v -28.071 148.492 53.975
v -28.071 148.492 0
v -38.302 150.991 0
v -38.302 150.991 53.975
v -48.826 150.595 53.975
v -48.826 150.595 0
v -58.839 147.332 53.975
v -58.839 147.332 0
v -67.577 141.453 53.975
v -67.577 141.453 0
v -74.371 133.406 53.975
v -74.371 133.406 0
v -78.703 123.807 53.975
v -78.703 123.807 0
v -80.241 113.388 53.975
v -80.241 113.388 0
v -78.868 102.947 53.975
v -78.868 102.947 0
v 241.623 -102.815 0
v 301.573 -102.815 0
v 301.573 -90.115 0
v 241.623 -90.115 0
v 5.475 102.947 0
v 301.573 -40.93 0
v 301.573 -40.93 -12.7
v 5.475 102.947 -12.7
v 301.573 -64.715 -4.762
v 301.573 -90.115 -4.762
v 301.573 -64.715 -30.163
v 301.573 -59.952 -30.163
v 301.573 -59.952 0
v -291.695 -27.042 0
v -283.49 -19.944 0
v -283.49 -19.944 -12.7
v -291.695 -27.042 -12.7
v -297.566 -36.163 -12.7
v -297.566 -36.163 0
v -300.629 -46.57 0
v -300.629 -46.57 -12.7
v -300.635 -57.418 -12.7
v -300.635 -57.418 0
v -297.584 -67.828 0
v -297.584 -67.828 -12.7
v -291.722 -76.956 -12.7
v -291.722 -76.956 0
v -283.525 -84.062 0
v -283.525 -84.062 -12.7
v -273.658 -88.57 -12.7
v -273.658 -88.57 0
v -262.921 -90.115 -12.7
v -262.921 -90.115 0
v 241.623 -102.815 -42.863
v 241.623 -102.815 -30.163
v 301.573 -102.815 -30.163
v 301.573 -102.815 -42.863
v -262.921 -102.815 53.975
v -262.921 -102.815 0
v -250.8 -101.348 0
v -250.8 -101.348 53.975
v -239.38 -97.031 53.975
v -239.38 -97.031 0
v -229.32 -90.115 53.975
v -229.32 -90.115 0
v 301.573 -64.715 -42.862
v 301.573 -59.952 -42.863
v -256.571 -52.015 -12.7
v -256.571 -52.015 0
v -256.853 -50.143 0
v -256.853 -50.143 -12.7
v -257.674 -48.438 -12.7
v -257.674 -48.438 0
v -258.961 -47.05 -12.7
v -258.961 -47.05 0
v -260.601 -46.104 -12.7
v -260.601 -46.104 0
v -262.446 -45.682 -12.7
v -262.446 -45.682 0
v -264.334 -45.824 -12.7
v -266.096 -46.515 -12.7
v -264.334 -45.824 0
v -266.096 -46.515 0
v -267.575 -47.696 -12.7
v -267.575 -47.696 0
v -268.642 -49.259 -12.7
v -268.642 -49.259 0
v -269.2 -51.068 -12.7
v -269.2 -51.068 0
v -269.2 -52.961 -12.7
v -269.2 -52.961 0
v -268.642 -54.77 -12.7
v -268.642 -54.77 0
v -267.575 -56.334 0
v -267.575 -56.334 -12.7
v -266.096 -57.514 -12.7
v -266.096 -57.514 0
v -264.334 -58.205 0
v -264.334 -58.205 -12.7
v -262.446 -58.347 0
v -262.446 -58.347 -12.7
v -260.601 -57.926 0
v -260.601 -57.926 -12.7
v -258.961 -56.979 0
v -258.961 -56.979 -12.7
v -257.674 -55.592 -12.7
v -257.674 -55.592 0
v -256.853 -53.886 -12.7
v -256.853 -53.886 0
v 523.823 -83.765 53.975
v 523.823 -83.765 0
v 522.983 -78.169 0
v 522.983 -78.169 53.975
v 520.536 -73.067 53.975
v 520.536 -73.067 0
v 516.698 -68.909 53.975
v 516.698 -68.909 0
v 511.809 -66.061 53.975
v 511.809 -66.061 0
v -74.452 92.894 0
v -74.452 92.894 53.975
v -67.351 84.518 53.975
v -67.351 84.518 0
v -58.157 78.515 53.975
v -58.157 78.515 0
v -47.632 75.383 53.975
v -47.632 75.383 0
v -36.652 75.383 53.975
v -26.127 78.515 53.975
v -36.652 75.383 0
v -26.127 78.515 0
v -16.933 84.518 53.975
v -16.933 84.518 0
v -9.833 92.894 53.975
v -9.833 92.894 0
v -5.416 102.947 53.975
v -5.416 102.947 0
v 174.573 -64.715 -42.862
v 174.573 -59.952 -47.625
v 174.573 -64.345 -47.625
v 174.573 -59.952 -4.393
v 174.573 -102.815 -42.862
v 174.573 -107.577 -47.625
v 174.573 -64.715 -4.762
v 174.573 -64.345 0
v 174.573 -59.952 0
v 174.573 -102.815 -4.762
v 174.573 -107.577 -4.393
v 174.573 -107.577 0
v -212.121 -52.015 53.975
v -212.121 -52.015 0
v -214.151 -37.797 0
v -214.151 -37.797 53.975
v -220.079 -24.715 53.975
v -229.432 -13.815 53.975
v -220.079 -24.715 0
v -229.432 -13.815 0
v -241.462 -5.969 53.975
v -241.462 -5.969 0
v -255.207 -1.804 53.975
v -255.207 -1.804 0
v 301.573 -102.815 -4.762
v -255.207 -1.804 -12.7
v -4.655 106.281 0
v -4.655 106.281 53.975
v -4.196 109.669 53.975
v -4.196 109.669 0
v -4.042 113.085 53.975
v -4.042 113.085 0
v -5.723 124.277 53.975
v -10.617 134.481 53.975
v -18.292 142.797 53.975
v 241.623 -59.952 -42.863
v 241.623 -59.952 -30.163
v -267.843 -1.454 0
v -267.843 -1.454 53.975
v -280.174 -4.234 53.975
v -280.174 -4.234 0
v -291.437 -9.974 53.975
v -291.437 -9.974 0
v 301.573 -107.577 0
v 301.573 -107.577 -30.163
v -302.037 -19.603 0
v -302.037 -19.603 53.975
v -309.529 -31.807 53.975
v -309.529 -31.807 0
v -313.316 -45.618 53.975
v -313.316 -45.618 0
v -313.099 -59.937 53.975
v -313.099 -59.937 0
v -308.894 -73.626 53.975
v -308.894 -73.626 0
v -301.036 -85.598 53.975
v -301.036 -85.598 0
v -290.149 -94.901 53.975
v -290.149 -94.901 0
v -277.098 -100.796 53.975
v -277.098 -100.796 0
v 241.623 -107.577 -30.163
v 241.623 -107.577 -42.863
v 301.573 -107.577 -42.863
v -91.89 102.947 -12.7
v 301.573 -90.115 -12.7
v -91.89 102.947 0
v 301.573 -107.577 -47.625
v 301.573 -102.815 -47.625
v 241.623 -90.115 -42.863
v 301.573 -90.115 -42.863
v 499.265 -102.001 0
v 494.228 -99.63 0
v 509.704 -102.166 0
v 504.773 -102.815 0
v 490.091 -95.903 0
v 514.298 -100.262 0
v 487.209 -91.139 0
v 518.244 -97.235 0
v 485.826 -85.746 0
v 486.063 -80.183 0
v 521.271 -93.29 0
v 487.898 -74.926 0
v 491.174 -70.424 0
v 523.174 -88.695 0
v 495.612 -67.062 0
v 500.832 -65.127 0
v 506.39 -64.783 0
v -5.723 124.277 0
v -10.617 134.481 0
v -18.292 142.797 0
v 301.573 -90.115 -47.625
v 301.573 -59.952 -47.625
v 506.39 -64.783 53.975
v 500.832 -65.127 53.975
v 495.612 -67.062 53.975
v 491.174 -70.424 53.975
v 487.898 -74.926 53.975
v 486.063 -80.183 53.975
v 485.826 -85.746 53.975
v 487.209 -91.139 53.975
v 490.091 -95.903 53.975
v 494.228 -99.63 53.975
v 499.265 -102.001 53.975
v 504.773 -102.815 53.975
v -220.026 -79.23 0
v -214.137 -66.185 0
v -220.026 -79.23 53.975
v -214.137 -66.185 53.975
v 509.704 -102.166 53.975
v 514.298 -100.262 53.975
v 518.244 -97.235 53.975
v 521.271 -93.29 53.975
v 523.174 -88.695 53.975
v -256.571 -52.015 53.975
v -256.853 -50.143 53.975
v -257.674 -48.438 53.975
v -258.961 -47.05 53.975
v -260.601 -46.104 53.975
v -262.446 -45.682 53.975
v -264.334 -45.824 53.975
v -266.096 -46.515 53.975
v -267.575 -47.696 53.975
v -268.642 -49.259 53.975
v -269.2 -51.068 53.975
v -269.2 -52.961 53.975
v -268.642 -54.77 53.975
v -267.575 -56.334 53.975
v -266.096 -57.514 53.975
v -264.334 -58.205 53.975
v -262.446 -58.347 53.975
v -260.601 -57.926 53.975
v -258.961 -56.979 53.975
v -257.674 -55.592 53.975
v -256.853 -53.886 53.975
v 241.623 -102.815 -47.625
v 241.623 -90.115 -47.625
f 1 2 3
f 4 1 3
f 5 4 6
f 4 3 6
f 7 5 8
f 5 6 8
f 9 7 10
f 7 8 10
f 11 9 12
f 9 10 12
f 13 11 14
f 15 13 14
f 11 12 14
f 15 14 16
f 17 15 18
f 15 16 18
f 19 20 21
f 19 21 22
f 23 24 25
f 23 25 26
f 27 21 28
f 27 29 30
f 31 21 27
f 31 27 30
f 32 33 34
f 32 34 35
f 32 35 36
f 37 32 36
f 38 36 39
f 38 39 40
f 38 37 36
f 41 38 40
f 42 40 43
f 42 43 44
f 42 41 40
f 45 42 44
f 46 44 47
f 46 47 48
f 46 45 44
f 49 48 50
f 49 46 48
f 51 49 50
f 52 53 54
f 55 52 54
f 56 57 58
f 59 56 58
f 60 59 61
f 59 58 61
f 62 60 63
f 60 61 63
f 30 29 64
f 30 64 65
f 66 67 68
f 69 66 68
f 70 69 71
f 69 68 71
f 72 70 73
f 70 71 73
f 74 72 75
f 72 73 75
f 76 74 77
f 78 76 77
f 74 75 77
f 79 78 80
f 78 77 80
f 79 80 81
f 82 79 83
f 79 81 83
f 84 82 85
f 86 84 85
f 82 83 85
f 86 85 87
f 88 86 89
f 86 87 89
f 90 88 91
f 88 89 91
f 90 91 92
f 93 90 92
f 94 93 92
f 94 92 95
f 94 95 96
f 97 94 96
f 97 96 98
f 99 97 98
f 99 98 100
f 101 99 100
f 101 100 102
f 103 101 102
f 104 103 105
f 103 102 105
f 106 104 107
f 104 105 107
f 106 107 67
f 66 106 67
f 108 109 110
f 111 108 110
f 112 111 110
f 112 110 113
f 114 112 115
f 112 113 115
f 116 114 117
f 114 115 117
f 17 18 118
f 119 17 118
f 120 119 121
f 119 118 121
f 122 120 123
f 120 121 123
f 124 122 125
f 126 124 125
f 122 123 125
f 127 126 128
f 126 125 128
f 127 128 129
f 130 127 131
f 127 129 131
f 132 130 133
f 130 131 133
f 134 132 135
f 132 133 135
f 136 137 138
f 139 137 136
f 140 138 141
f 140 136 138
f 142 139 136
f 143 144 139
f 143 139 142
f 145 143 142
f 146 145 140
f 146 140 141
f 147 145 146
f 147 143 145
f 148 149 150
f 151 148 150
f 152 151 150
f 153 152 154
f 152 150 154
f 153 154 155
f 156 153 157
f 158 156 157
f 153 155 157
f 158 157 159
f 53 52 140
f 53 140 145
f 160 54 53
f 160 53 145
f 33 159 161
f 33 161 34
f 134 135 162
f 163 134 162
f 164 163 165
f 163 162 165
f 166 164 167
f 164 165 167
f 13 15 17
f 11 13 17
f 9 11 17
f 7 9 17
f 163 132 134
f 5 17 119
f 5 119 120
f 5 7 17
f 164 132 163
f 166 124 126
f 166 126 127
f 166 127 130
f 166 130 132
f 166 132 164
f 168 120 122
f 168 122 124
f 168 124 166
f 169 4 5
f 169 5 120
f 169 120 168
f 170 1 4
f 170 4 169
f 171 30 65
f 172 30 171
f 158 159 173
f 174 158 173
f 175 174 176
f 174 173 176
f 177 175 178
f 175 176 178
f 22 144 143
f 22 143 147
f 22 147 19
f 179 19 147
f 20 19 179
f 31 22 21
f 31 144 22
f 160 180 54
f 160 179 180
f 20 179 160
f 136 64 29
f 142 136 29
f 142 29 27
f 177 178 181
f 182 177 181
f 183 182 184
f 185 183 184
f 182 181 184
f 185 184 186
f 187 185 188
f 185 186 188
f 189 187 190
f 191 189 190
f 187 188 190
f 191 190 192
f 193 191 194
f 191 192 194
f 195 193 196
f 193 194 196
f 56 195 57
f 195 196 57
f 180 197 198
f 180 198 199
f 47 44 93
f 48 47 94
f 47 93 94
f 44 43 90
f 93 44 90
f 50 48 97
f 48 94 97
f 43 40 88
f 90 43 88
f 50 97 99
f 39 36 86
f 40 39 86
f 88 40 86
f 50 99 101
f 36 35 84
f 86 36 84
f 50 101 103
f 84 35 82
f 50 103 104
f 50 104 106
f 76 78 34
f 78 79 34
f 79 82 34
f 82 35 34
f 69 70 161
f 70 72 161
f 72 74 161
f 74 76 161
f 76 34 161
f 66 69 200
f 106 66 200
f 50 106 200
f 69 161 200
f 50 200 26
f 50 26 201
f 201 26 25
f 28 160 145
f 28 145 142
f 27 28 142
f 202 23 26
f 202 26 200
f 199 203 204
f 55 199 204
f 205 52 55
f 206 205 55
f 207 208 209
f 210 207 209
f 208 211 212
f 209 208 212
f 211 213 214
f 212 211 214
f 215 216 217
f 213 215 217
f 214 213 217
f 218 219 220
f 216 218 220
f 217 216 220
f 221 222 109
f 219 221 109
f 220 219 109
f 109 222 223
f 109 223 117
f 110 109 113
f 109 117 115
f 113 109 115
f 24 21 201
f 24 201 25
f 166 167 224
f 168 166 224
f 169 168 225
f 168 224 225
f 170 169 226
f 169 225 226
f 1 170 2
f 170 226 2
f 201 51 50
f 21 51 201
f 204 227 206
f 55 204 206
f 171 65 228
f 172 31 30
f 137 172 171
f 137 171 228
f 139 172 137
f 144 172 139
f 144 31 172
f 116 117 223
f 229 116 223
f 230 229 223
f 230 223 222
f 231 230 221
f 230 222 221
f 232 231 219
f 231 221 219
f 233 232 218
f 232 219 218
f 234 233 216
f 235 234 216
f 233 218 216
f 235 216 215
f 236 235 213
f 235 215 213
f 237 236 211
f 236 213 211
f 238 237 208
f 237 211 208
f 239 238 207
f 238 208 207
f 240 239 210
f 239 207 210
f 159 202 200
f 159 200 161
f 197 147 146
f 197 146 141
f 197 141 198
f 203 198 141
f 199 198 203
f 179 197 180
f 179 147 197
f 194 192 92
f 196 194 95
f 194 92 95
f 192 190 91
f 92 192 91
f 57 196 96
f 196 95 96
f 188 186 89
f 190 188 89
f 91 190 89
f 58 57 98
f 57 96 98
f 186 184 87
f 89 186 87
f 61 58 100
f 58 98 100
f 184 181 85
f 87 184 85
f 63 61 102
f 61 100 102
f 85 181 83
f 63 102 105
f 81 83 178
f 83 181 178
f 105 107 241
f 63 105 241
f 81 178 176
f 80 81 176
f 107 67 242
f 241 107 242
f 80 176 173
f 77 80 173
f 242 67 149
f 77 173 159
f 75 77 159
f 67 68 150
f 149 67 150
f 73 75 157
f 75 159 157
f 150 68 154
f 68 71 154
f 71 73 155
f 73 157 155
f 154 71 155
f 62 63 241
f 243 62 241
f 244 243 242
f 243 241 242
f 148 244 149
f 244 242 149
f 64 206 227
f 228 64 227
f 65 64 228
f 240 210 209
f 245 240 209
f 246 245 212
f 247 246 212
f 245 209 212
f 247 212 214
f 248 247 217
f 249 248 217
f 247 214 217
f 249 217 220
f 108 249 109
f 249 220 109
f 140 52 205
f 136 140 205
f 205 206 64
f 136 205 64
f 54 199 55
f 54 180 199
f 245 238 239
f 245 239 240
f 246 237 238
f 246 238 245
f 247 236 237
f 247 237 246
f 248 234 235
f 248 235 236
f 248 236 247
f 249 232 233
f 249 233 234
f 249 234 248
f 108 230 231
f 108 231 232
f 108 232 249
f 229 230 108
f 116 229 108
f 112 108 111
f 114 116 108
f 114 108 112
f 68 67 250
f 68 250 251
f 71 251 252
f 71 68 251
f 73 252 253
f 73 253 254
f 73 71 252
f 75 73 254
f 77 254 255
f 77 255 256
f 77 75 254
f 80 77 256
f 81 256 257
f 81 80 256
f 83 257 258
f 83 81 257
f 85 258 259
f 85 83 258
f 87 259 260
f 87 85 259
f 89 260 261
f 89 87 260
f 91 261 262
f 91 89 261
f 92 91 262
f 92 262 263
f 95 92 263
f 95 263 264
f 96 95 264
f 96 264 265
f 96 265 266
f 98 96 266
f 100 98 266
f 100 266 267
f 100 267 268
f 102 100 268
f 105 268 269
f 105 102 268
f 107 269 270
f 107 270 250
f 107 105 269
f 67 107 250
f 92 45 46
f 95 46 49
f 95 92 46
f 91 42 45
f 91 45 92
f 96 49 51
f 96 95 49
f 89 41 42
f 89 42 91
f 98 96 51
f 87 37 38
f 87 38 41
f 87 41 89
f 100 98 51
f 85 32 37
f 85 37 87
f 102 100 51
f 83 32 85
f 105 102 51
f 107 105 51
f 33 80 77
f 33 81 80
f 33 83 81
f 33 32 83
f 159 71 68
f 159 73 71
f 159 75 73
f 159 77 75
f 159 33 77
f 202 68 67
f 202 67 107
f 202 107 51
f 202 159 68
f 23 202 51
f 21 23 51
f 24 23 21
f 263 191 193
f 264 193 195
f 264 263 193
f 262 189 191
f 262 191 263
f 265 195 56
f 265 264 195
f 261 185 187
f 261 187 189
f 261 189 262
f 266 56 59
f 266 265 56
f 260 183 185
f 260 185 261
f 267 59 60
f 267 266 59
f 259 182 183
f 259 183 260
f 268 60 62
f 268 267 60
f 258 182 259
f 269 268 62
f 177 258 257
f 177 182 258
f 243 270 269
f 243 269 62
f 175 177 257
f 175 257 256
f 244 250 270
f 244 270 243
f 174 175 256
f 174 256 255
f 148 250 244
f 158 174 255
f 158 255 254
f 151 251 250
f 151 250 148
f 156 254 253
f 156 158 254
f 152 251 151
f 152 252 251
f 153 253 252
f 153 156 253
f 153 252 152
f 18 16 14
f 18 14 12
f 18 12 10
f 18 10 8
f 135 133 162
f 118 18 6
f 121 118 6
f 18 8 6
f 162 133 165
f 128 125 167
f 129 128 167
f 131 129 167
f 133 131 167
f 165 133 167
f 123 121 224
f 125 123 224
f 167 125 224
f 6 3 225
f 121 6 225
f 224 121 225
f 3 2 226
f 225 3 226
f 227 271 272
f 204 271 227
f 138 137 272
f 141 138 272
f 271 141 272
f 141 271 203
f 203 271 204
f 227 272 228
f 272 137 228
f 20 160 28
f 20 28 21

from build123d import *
from build123d import SkipClean  # not in build123d's __all__

# Parameters (mm, degrees)
F0_W            = 67.0499014769
F0_H            = 12.7
F0_H_2          = 4.7625
F0_W_2          = 59.9500985231
F0_H_3          = 25.7697334349
F1_DEPTH        = 47.625
F1_COPIES_COUNT = 2
F1_COPIES_ANGLE = 90
F2_W            = 38.1
F2_H            = 38.1
F3_DEPTH        = 127
F0_R            = 6.35
F0_W_3          = 339.3500985231
F4_DEPTH        = 12.7
F5_DEPTH        = 53.975


# Not quite as in the source:
# - a pattern or mirror of a feature is missing from the dataset's text; its kind, count and spacing are read off the source's solid
# - a feature names something its author has since deleted; it is built from what else it names


with BuildPart() as f1:
    # F0 (on Top) → F1 (new body)
    with BuildSketch(Plane.XY):
        with Locations((208.0981279893, -96.4646462023)):
            Rectangle(F0_W, F0_H)
        with Locations((208.0981279893, -105.1958962023)):
            Rectangle(F0_W, F0_H_2)
        with Locations((271.5981279893, -105.1958962023)):
            Rectangle(F0_W_2, F0_H_2)
        with Locations((208.0981279893, -77.2297794849)):
            Rectangle(F0_W, F0_H_3)
        Polygon((241.6230787277, -64.3449127674), (241.6230787277, -90.1146462023), (301.5731772508, -90.1146462023), (301.5731772508, -59.9521462023), (174.5731772508, -59.9521462023), (174.5731772508, -64.3449127674), align=None)
    extrude(amount=-F1_DEPTH)

    # F1_copies: F1 ×2 about axis
    f1_copies_axis = Axis((0, -83.764646, -23.8125), (1, 0, 0))


with BuildPart() as f1_1:
    add(f1.part, clean=False)
    with SkipClean():  # cleaning this boolean's faces spoils the solid; the shape is the same uncleaned
        for i in range(1, F1_COPIES_COUNT):
            add(f1.part.rotate(f1_copies_axis, i * F1_COPIES_ANGLE / (F1_COPIES_COUNT - 1)), clean=False)

    # F2 (on face) → F3 (cut, through all)
    with BuildSketch(Plane.YZ.offset(301.5731772508)):
        with Locations((-83.7646462023, -23.8125)):
            Rectangle(F2_W, F2_H)
    with SkipClean():  # cleaning this boolean's faces spoils the solid; the shape is the same uncleaned
        extrude(amount=-F3_DEPTH, mode=Mode.SUBTRACT)


with BuildPart() as f4:
    # F0 (on Top) → F4 (new body)
    with BuildSketch(Plane.XY):
        with BuildLine():
            Line((-91.8902158737, 102.9467433691), (-255.2069353227, -1.8036898565))
            ThreePointArc((-255.2069353227, -1.8036898565), (-224.3686917514, -18.9330173376), (-212.1205507423, -52.0146462023))
            ThreePointArc((-212.1205507423, -52.0146462023), (-216.6195090918, -72.9156878528), (-229.3195090918, -90.1146462023))
            Line((-229.3195090918, -90.1146462023), (-164.7769212723, -90.1146462023))
            Line((-164.7769212723, -90.1146462023), (-164.7769212723, -64.3449127674))
            Line((-164.7769212723, -64.3449127674), (174.5731772508, -64.3449127674))
            Line((174.5731772508, -64.3449127674), (174.5731772508, -59.9521462023))
            Line((174.5731772508, -59.9521462023), (301.5731772508, -59.9521462023))
            Line((301.5731772508, -59.9521462023), (301.5731772508, -40.9296154976))
            Line((301.5731772508, -40.9296154976), (5.4748591793, 102.9467433691))
            Line((5.4748591793, 102.9467433691), (-5.4159459459, 102.9467433691))
            ThreePointArc((-5.4159459459, 102.9467433691), (-42.1422114596, 74.9853537977), (-78.8684769732, 102.9467433691))
            Line((-78.8684769732, 102.9467433691), (-91.8902158737, 102.9467433691))
        make_face()
        with BuildLine():
            ThreePointArc((-212.1205507423, -52.0146462023), (-224.3686917514, -18.9330173376), (-255.2069353227, -1.8036898565))
            Line((-255.2069353227, -1.8036898565), (-283.4902114903, -19.9444254873))
            ThreePointArc((-283.4902114903, -19.9444254873), (-244.646170787, -18.5832681684), (-224.8205507423, -52.0146462023))
            ThreePointArc((-224.8205507423, -52.0146462023), (-235.9797823791, -78.9554145655), (-262.9205507423, -90.1146462023))
            Line((-262.9205507423, -90.1146462023), (-229.3195090918, -90.1146462023))
            ThreePointArc((-229.3195090918, -90.1146462023), (-216.6195090918, -72.9156878528), (-212.1205507423, -52.0146462023))
        make_face()
        with BuildLine():
            ThreePointArc((-224.8205507423, -52.0146462023), (-244.646170787, -18.5832681684), (-283.4902114903, -19.9444254873))
            ThreePointArc((-283.4902114903, -19.9444254873), (-299.4820428429, -62.7322623262), (-262.9205507423, -90.1146462023))
            ThreePointArc((-262.9205507423, -90.1146462023), (-235.9797823791, -78.9554145655), (-224.8205507423, -52.0146462023))
        make_face()
        with Locations((-262.9205507423, -52.0146462023)):
            Circle(F0_R, mode=Mode.SUBTRACT)
        with Locations((4.8981279893, -77.2297794849)):
            Rectangle(F0_W_3, F0_H_3)
        with BuildLine():
            Line((-5.4159459459, 102.9467433691), (-78.8684769732, 102.9467433691))
            ThreePointArc((-78.8684769732, 102.9467433691), (-42.1422114596, 74.9853537977), (-5.4159459459, 102.9467433691))
        make_face()
        with Locations((208.0981279893, -77.2297794849)):
            Rectangle(F0_W, F0_H_3)
        Polygon((241.6230787277, -64.3449127674), (241.6230787277, -90.1146462023), (301.5731772508, -90.1146462023), (301.5731772508, -59.9521462023), (174.5731772508, -59.9521462023), (174.5731772508, -64.3449127674), align=None)
    extrude(amount=-F4_DEPTH)


with BuildPart() as f5:
    # F0 (on Top) → F5 (new body)
    with BuildSketch(Plane.XY):
        with BuildLine():
            ThreePointArc((-28.0713410878, 148.4918589483), (-46.2820197032, 150.9597777234), (-63.5295651655, 144.616149878))
            ThreePointArc((-63.5295651655, 144.616149878), (-77.896694317, 126.2469249653), (-78.8684769732, 102.9467433691))
            Line((-78.8684769732, 102.9467433691), (-5.4159459459, 102.9467433691))
            ThreePointArc((-5.4159459459, 102.9467433691), (-4.3872070491, 107.9697265668), (-4.0422114596, 113.0853537977))
            ThreePointArc((-4.0422114596, 113.0853537977), (-10.6167442849, 134.4805616587), (-28.0713410878, 148.4918589483))
        make_face()
        with BuildLine():
            Line((-5.4159459459, 102.9467433691), (-78.8684769732, 102.9467433691))
            ThreePointArc((-78.8684769732, 102.9467433691), (-42.1422114596, 74.9853537977), (-5.4159459459, 102.9467433691))
        make_face()
    extrude(amount=F5_DEPTH)


with BuildPart() as f5b:
    # F0 (on Top) → F5, piece 2 (new body)
    with BuildSketch(Plane.XY):
        with BuildLine():
            ThreePointArc((-255.2069353227, -1.8036898565), (-274.0953662705, -2.4589855982), (-291.4370223503, -9.973584762))
            ThreePointArc((-291.4370223503, -9.973584762), (-311.4814708385, -66.9303104321), (-262.9205507423, -102.8146462023))
            ThreePointArc((-262.9205507423, -102.8146462023), (-244.9600385002, -99.5336950144), (-229.3195090918, -90.1146462023))
            Line((-229.3195090918, -90.1146462023), (-262.9205507423, -90.1146462023))
            ThreePointArc((-262.9205507423, -90.1146462023), (-299.4820428429, -62.7322623262), (-283.4902114903, -19.9444254873))
            Line((-283.4902114903, -19.9444254873), (-255.2069353227, -1.8036898565))
        make_face()
        with BuildLine():
            ThreePointArc((-224.8205507423, -52.0146462023), (-244.646170787, -18.5832681684), (-283.4902114903, -19.9444254873))
            ThreePointArc((-283.4902114903, -19.9444254873), (-299.4820428429, -62.7322623262), (-262.9205507423, -90.1146462023))
            ThreePointArc((-262.9205507423, -90.1146462023), (-235.9797823791, -78.9554145655), (-224.8205507423, -52.0146462023))
        make_face()
        with Locations((-262.9205507423, -52.0146462023)):
            Circle(F0_R, mode=Mode.SUBTRACT)
        with BuildLine():
            ThreePointArc((-212.1205507423, -52.0146462023), (-224.3686917514, -18.9330173376), (-255.2069353227, -1.8036898565))
            Line((-255.2069353227, -1.8036898565), (-283.4902114903, -19.9444254873))
            ThreePointArc((-283.4902114903, -19.9444254873), (-244.646170787, -18.5832681684), (-224.8205507423, -52.0146462023))
            ThreePointArc((-224.8205507423, -52.0146462023), (-235.9797823791, -78.9554145655), (-262.9205507423, -90.1146462023))
            Line((-262.9205507423, -90.1146462023), (-229.3195090918, -90.1146462023))
            ThreePointArc((-229.3195090918, -90.1146462023), (-216.6195090918, -72.9156878528), (-212.1205507423, -52.0146462023))
        make_face()
    extrude(amount=F5_DEPTH)


with BuildPart() as f5c:
    # F0 (on Top) → F5, piece 3 (new body)
    with BuildSketch(Plane.XY):
        with BuildLine():
            ThreePointArc((523.8231772508, -83.7646462023), (520.5359108382, -73.0670422718), (511.8086124367, -66.061393627))
            ThreePointArc((511.8086124367, -66.061393627), (486.0628931595, -80.1830586744), (504.7731772508, -102.8146462023))
            ThreePointArc((504.7731772508, -102.8146462023), (518.2435614324, -97.2350303839), (523.8231772508, -83.7646462023))
        make_face()
    extrude(amount=F5_DEPTH)


solid = Compound([f1_1.part, f4.part, f5.part, f5b.part, f5c.part])
